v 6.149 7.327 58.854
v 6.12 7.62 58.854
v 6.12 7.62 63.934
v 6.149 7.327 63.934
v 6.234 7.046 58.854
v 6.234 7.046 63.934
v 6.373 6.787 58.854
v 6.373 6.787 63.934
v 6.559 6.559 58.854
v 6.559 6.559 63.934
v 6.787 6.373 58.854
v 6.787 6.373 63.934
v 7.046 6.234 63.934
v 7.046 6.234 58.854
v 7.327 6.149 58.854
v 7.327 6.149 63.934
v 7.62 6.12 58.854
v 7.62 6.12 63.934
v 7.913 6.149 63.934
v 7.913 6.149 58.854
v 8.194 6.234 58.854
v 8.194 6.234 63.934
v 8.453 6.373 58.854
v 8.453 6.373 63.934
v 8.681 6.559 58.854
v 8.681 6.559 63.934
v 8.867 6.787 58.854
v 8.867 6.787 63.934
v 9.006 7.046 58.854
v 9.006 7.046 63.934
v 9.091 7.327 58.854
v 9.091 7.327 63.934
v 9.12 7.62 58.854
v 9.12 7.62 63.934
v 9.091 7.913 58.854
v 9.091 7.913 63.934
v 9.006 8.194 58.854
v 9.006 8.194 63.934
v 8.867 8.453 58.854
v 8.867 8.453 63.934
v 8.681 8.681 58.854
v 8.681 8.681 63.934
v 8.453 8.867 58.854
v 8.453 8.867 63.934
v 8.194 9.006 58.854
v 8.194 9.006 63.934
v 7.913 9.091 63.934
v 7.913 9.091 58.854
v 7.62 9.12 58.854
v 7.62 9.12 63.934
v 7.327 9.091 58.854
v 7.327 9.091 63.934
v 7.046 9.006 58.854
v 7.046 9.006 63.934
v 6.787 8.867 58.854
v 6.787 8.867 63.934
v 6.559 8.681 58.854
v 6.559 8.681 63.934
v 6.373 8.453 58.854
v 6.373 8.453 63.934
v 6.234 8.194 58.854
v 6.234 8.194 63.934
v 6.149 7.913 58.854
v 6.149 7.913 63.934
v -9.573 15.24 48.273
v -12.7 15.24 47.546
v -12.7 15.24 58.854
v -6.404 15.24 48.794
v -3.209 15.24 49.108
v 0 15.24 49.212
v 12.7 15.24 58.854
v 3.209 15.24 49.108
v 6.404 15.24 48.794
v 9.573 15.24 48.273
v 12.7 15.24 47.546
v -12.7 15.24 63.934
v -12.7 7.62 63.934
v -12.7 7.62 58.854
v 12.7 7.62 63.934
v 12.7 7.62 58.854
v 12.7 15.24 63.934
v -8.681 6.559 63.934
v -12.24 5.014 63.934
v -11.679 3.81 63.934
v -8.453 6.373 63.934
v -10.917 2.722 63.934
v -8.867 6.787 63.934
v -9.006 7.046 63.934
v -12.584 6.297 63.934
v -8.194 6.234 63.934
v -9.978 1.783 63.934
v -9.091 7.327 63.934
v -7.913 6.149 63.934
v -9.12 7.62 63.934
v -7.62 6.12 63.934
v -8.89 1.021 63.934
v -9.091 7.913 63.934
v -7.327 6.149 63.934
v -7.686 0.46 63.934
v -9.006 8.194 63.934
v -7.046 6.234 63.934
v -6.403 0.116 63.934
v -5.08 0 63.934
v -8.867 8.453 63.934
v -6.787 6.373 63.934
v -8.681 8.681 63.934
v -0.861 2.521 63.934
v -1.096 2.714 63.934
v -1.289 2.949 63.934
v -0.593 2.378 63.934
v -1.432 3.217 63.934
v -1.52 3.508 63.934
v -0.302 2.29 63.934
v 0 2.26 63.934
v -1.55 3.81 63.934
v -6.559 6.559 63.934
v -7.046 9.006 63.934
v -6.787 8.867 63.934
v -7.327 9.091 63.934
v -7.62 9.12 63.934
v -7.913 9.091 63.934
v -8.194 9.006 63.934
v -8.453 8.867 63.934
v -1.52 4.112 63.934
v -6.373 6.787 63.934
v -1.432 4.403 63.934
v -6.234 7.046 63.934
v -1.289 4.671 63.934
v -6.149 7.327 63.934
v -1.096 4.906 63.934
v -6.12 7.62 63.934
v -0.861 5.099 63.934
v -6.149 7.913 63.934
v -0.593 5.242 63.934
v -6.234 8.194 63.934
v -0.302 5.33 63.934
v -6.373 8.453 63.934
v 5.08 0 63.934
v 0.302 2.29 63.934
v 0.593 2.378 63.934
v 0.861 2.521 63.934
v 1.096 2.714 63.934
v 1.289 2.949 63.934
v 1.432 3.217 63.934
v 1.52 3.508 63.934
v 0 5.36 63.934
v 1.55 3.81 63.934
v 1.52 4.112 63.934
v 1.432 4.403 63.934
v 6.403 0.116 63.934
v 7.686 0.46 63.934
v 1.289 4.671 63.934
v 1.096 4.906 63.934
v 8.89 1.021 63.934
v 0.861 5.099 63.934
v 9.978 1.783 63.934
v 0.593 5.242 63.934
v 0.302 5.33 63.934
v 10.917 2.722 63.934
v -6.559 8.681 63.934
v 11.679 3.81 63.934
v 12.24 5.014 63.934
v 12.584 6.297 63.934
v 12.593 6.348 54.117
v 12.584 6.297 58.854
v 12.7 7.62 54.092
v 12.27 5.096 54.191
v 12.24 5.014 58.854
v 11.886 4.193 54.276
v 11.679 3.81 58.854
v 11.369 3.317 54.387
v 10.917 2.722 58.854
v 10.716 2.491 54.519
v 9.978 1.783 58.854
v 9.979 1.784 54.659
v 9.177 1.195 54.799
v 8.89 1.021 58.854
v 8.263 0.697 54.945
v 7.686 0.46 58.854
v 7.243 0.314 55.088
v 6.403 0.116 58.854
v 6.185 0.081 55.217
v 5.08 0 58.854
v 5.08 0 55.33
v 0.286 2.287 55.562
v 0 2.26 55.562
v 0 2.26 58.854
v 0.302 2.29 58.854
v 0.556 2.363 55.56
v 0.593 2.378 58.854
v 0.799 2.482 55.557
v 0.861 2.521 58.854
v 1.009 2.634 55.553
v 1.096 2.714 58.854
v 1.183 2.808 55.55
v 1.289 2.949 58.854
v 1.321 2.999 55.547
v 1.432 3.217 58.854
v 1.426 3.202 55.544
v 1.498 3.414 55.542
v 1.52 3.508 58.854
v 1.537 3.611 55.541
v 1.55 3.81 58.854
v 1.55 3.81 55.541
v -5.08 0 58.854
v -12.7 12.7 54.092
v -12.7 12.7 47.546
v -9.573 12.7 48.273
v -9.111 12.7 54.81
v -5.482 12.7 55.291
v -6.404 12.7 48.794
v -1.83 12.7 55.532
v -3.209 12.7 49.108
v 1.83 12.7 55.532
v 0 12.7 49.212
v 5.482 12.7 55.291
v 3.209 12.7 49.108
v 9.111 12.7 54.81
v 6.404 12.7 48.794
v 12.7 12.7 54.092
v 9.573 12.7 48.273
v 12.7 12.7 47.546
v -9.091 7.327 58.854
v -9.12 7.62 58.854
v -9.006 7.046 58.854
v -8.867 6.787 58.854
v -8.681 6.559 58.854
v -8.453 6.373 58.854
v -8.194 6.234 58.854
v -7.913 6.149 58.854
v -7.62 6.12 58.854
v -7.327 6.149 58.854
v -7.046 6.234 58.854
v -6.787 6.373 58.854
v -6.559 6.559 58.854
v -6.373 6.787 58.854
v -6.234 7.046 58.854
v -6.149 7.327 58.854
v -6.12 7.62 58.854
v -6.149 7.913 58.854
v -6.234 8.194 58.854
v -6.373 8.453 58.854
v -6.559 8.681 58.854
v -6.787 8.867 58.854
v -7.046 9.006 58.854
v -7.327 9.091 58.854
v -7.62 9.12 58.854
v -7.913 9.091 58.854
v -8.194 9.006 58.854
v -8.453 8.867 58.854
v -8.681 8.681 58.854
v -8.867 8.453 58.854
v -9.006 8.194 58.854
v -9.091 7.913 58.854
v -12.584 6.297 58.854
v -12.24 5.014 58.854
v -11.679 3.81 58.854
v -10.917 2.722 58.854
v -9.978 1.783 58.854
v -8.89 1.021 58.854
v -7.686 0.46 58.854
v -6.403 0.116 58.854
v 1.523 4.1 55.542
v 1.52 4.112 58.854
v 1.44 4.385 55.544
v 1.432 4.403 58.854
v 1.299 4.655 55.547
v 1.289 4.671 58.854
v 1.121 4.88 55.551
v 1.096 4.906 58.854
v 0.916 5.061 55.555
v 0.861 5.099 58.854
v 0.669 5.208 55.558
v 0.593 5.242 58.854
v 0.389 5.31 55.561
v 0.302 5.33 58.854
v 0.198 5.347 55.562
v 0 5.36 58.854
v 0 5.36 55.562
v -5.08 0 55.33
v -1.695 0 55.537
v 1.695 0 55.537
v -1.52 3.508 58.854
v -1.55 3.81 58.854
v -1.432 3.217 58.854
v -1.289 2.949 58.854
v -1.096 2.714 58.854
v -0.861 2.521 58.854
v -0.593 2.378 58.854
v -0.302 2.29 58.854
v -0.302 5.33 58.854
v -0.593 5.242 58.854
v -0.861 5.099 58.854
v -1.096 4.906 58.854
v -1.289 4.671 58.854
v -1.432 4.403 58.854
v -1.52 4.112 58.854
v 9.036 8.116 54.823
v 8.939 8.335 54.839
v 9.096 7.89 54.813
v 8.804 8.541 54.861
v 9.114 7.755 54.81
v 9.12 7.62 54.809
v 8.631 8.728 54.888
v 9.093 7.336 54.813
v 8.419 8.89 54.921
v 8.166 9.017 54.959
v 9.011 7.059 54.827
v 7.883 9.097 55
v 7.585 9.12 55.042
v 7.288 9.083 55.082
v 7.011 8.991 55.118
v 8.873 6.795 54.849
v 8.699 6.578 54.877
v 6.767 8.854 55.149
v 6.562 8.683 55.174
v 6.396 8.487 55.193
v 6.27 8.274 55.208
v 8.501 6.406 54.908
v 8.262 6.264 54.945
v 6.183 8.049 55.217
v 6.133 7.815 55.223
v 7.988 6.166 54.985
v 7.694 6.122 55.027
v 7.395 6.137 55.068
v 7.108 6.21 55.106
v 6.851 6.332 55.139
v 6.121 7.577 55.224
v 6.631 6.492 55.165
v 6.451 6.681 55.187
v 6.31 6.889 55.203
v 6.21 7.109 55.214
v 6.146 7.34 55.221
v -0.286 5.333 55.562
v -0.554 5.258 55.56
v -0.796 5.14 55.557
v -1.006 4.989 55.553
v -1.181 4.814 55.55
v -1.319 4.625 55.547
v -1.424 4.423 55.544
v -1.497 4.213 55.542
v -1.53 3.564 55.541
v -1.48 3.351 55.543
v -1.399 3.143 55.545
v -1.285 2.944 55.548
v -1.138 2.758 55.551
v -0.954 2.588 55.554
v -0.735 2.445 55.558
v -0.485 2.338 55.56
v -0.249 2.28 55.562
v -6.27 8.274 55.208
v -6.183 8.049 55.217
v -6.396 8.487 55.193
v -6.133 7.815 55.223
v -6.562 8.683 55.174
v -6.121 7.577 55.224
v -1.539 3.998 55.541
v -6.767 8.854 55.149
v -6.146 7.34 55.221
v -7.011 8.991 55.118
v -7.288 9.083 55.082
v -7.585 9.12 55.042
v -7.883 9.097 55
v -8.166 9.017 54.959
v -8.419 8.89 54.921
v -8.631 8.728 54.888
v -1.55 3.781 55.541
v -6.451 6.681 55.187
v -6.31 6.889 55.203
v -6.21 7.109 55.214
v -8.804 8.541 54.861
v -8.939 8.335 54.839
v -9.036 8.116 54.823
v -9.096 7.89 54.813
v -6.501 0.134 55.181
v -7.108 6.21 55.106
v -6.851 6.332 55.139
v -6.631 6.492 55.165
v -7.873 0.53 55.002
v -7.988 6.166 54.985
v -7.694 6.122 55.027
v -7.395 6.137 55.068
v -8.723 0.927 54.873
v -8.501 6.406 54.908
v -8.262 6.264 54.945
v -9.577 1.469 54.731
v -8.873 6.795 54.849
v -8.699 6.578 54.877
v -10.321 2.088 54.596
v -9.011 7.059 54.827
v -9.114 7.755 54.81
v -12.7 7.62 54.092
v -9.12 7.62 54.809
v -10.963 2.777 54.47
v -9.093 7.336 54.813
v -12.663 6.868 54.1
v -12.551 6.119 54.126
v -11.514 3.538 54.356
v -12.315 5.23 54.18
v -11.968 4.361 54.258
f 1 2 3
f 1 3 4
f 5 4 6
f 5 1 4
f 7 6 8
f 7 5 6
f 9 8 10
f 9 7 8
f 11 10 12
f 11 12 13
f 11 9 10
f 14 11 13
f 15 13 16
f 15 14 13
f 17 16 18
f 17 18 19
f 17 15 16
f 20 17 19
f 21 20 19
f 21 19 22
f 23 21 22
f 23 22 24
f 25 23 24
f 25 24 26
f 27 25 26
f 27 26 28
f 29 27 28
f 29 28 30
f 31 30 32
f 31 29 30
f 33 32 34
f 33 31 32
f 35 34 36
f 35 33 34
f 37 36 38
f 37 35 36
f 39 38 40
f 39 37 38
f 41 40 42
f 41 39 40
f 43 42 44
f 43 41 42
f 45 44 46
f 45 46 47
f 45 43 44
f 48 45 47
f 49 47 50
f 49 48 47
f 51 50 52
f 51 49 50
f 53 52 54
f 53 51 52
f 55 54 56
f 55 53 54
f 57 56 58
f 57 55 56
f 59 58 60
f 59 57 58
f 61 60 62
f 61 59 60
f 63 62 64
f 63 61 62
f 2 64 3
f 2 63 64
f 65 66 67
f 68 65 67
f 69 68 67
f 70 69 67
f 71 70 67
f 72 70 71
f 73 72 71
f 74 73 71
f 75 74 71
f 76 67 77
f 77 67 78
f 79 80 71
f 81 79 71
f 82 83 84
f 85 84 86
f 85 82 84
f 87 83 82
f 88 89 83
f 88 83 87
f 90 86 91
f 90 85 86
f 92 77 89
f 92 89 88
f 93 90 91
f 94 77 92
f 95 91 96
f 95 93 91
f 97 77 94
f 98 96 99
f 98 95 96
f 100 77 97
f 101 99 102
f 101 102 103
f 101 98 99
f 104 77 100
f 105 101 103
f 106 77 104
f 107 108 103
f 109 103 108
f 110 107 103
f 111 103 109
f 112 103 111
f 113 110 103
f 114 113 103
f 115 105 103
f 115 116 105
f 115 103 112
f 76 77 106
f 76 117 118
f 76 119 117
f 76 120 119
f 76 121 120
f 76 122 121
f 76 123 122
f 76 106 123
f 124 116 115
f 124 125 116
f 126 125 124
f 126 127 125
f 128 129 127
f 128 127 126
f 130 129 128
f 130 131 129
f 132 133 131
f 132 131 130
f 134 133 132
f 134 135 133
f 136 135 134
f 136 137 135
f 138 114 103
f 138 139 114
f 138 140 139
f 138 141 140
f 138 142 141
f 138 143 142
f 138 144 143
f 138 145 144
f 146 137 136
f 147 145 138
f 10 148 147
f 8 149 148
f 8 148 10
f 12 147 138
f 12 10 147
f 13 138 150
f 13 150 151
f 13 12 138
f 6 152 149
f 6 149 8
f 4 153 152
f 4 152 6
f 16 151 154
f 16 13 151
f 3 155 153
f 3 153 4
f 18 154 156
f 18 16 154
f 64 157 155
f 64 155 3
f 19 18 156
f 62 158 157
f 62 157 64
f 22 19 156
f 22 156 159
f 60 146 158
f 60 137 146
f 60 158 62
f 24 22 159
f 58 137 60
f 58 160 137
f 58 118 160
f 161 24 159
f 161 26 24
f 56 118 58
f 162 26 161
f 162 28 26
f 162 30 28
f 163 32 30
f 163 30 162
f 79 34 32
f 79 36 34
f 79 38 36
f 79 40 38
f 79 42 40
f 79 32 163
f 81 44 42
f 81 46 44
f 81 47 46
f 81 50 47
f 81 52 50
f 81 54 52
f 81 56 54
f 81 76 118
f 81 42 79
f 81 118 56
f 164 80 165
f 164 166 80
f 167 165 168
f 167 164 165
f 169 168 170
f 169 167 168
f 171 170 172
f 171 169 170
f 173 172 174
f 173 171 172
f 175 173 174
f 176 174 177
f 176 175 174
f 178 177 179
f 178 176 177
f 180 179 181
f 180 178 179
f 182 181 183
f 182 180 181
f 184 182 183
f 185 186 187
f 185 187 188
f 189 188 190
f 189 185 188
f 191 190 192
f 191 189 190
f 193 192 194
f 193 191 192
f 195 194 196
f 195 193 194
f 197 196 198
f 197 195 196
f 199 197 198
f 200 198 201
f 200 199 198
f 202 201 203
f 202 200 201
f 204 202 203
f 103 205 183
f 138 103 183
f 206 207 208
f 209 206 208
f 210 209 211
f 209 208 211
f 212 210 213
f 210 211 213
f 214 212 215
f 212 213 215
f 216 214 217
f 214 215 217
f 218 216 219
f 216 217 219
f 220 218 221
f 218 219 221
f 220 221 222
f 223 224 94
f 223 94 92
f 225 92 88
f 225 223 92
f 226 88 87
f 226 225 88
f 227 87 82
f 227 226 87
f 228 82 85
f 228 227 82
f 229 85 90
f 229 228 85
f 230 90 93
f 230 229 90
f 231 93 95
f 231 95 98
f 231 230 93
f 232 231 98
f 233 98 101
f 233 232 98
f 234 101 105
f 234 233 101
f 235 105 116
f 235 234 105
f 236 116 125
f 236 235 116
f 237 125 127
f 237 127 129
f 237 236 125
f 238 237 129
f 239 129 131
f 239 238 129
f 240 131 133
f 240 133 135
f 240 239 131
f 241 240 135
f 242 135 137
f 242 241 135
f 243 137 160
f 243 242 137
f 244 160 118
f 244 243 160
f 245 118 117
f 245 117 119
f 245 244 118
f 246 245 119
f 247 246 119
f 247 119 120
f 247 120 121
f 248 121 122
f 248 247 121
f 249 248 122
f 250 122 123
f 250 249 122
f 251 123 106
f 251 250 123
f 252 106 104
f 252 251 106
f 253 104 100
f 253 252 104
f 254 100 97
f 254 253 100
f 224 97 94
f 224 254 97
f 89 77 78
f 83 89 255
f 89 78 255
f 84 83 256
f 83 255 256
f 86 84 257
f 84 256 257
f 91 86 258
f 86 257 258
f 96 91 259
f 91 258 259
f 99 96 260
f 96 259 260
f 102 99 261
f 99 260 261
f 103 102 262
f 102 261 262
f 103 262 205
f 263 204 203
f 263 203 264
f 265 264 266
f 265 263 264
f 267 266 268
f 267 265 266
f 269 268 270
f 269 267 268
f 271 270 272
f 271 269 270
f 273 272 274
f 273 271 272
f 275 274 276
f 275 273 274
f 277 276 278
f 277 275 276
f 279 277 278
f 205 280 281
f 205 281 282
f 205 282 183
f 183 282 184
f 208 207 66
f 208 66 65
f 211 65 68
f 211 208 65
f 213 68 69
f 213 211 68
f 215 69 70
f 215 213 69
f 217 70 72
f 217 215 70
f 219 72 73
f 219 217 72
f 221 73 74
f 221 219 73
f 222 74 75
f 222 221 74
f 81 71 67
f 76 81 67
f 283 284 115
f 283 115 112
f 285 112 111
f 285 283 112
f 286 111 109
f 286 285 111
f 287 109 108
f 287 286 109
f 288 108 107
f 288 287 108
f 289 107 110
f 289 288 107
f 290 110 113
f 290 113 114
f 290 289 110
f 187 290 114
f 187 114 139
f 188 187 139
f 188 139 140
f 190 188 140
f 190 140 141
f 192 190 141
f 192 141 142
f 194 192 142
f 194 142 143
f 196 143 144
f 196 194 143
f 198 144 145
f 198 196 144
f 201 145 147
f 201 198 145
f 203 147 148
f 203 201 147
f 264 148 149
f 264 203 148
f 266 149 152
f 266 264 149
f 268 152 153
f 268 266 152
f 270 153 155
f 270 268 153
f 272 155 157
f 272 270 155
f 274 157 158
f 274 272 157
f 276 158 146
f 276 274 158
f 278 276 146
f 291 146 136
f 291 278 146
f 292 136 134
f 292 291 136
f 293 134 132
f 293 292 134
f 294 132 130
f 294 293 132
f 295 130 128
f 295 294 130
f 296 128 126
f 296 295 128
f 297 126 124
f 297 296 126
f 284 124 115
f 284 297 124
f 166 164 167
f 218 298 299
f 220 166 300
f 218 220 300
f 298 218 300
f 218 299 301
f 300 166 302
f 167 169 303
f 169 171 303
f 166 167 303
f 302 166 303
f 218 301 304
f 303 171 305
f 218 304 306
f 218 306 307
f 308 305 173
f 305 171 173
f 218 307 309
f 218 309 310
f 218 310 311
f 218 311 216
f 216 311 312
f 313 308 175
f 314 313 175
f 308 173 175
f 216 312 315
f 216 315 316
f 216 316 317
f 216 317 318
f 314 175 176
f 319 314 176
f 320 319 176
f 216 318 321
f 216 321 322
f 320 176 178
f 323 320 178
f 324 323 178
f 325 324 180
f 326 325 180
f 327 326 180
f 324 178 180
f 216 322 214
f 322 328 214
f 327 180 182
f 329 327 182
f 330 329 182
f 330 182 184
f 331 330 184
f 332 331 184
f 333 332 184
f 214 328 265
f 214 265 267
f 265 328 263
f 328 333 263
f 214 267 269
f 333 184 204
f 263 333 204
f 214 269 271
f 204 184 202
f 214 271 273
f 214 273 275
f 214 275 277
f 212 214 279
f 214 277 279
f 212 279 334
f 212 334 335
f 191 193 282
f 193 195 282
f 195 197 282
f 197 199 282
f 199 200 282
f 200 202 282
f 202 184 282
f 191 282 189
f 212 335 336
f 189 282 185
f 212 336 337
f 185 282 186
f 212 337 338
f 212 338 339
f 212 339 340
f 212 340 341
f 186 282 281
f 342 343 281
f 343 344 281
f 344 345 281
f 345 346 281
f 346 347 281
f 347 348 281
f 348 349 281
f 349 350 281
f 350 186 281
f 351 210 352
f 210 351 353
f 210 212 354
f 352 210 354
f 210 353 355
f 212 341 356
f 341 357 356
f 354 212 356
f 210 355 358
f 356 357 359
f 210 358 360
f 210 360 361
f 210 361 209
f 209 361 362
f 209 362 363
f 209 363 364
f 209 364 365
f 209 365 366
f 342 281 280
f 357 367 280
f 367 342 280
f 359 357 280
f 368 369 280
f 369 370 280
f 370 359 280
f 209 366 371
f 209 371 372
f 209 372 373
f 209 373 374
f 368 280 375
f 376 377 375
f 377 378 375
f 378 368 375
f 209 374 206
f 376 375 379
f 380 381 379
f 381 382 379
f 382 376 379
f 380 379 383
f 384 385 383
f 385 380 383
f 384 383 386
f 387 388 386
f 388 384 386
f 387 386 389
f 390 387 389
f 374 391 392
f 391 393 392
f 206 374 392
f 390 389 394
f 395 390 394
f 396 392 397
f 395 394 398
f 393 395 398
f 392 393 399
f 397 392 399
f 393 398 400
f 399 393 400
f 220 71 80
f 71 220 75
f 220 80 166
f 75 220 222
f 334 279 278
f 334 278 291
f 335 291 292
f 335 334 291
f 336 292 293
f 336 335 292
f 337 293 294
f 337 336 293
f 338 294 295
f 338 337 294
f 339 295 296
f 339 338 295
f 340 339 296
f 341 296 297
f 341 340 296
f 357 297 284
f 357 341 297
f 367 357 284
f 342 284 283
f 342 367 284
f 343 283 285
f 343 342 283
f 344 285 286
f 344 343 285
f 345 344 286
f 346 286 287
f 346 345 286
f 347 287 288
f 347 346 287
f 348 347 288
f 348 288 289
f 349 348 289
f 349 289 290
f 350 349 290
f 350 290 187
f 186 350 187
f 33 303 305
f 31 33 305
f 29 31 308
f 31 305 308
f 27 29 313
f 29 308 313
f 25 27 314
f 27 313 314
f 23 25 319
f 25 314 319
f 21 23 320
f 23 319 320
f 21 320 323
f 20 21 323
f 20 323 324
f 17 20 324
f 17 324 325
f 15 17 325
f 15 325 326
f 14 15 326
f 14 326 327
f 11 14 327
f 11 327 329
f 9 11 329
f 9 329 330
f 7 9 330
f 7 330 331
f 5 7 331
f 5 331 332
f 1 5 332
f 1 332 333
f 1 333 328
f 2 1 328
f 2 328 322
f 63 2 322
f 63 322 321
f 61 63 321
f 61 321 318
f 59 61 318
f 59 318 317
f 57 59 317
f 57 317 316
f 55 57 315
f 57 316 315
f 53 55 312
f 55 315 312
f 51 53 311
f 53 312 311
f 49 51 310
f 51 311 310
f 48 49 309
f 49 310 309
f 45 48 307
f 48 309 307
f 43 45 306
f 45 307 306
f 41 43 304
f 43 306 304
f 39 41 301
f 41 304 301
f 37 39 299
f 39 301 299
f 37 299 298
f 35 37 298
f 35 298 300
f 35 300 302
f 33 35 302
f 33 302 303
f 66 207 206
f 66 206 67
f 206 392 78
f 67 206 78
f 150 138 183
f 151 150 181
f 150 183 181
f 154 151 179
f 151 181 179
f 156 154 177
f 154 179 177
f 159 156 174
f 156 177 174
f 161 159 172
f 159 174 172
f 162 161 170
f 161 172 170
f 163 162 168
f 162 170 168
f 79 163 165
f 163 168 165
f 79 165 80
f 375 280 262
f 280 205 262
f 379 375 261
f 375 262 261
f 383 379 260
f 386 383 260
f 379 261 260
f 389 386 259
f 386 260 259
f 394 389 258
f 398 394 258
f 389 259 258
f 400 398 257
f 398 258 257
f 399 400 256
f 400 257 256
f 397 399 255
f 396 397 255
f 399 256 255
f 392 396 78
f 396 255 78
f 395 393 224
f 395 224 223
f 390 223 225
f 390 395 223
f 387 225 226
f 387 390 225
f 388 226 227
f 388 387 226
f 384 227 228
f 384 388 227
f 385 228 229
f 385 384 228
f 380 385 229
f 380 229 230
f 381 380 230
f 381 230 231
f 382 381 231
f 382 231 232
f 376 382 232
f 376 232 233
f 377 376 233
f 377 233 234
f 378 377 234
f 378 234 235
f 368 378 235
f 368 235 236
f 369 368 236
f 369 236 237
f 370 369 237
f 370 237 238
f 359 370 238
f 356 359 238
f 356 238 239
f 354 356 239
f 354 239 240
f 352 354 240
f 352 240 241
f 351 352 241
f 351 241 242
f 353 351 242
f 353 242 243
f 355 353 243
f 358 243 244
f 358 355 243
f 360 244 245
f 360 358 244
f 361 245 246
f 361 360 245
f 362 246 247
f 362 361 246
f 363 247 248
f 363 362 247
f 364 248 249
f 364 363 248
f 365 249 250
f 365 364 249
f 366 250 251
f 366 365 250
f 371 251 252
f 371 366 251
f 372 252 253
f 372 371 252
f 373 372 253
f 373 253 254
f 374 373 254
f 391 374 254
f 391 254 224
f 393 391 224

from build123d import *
from build123d.topology import SkipClean

# Parameters (mm, degrees)
BOSS_EXTRUDE1_DEPTH = 12.7
SKETCH2_R           = 1.500000048
CUT_EXTRUDE1_DEPTH  = 58.854101994
FILLET1_R           = 7.62
CUT_EXTRUDE2_DEPTH  = 62.533611452
BOSS_EXTRUDE2_DEPTH = 2.54
SKETCH8_R           = 1.500000048
SKETCH8_R_2         = 1.549999948
BOSS_EXTRUDE3_DEPTH = 5.08


with BuildPart() as part:
    # Sketch1 → Boss-Extrude1 (new body)
    with BuildSketch(Plane(origin=(0, 0, 0), x_dir=(1, 0, 0), z_dir=(0, 1, 0))):
        with BuildLine():
            ThreePointArc((12.7, -54.091601994), (0, -55.5625), (-12.7, -54.091601994))
            Line((-12.7, -54.091601994), (-12.7, -58.854101994))
            Line((-12.7, -58.854101994), (12.7, -58.854101994))
            Line((12.7, -58.854101994), (12.7, -54.091601994))
        make_face()
    extrude(amount=BOSS_EXTRUDE1_DEPTH)

    # Sketch2 → Cut-Extrude1 (cut)
    with BuildSketch(Plane.XY):
        with Locations(Location((-7.62, 7.62, 0), (0, 0, 180))):
            Circle(SKETCH2_R)
    cut_extrude1 = extrude(amount=CUT_EXTRUDE1_DEPTH, mode=Mode.SUBTRACT)

    # Mirror1: Cut-Extrude1 across plane
    add(cut_extrude1.mirror(Plane(origin=(0, 0, 0), x_dir=(0, 0, 1), z_dir=(1, 0, 0))), mode=Mode.SUBTRACT)

    # Fillet1
    fillet1_edges = [part.edges().sort_by_distance(p)[0] for p in [
        (-12.7, 0, 56.472851994),
        (12.7, 0, 56.472851994),
    ]]
    fillet(fillet1_edges, radius=FILLET1_R)

    # Sketch2<4> → Cut-Extrude2 (cut, through all)
    with BuildSketch(Plane.XY):
        with BuildLine():
            ThreePointArc((1.549999948, 3.81), (1.096015474, 4.906015474), (0, 5.359999948))
            Line((0, 5.359999948), (0, 2.260000052))
            ThreePointArc((0, 2.260000052), (1.096015474, 2.713984526), (1.549999948, 3.81))
        make_face()
        with BuildLine():
            Line((0, 2.260000052), (0, 5.359999948))
            ThreePointArc((0, 5.359999948), (-1.549999948, 3.81), (0, 2.260000052))
        make_face()
    extrude(amount=CUT_EXTRUDE2_DEPTH, mode=Mode.SUBTRACT)

    # Sketch7 → Boss-Extrude2 (add)
    with BuildSketch(Plane(origin=(0, 12.7, 0), x_dir=(1, 0, 0), z_dir=(0, 1, 0))):
        with BuildLine():
            Line((-12.7, -54.091601994), (-12.7, -58.854101994))
            Line((-12.7, -58.854101994), (12.7, -58.854101994))
            Line((12.7, -58.854101994), (12.7, -54.091601994))
            ThreePointArc((12.7, -54.091601994), (0, -55.5625), (-12.7, -54.091601994))
        make_face()
        with BuildLine():
            ThreePointArc((-12.7, -47.545558744), (0, -49.2125), (12.7, -47.545558744))
            Line((12.7, -47.545558744), (12.7, -54.091601994))
            ThreePointArc((12.7, -54.091601994), (0, -55.5625), (-12.7, -54.091601994))
            Line((-12.7, -54.091601994), (-12.7, -47.545558744))
        make_face()
    extrude(amount=BOSS_EXTRUDE2_DEPTH)

    # Sketch8 → Boss-Extrude3 (add)
    with SkipClean():  # the faces are left unmerged after this step: merging them gives an invalid solid
        with BuildSketch(Plane.XY.offset(58.854101994)):
            with BuildLine():
                Line((-5.08, 0), (5.08, 0))
                ThreePointArc((5.08, 0), (10.468153673, 2.231846327), (12.7, 7.62))
                Line((12.7, 7.62), (12.7, 15.24))
                Line((12.7, 15.24), (-12.7, 15.24))
                Line((-12.7, 15.24), (-12.7, 7.62))
                ThreePointArc((-12.7, 7.62), (-10.468153673, 2.231846327), (-5.08, 0))
            make_face()
            with Locations(Location((7.62, 7.62, 0), (0, 0, 180))):
                Circle(SKETCH8_R, mode=Mode.SUBTRACT)
            with Locations(Location((0, 3.81, 0), (0, 0, 180))):
                Circle(SKETCH8_R_2, mode=Mode.SUBTRACT)
            with Locations(Location((-7.62, 7.62, 0), (0, 0, 180))):
                Circle(SKETCH8_R, mode=Mode.SUBTRACT)
        extrude(amount=BOSS_EXTRUDE3_DEPTH)


solid = part.part
